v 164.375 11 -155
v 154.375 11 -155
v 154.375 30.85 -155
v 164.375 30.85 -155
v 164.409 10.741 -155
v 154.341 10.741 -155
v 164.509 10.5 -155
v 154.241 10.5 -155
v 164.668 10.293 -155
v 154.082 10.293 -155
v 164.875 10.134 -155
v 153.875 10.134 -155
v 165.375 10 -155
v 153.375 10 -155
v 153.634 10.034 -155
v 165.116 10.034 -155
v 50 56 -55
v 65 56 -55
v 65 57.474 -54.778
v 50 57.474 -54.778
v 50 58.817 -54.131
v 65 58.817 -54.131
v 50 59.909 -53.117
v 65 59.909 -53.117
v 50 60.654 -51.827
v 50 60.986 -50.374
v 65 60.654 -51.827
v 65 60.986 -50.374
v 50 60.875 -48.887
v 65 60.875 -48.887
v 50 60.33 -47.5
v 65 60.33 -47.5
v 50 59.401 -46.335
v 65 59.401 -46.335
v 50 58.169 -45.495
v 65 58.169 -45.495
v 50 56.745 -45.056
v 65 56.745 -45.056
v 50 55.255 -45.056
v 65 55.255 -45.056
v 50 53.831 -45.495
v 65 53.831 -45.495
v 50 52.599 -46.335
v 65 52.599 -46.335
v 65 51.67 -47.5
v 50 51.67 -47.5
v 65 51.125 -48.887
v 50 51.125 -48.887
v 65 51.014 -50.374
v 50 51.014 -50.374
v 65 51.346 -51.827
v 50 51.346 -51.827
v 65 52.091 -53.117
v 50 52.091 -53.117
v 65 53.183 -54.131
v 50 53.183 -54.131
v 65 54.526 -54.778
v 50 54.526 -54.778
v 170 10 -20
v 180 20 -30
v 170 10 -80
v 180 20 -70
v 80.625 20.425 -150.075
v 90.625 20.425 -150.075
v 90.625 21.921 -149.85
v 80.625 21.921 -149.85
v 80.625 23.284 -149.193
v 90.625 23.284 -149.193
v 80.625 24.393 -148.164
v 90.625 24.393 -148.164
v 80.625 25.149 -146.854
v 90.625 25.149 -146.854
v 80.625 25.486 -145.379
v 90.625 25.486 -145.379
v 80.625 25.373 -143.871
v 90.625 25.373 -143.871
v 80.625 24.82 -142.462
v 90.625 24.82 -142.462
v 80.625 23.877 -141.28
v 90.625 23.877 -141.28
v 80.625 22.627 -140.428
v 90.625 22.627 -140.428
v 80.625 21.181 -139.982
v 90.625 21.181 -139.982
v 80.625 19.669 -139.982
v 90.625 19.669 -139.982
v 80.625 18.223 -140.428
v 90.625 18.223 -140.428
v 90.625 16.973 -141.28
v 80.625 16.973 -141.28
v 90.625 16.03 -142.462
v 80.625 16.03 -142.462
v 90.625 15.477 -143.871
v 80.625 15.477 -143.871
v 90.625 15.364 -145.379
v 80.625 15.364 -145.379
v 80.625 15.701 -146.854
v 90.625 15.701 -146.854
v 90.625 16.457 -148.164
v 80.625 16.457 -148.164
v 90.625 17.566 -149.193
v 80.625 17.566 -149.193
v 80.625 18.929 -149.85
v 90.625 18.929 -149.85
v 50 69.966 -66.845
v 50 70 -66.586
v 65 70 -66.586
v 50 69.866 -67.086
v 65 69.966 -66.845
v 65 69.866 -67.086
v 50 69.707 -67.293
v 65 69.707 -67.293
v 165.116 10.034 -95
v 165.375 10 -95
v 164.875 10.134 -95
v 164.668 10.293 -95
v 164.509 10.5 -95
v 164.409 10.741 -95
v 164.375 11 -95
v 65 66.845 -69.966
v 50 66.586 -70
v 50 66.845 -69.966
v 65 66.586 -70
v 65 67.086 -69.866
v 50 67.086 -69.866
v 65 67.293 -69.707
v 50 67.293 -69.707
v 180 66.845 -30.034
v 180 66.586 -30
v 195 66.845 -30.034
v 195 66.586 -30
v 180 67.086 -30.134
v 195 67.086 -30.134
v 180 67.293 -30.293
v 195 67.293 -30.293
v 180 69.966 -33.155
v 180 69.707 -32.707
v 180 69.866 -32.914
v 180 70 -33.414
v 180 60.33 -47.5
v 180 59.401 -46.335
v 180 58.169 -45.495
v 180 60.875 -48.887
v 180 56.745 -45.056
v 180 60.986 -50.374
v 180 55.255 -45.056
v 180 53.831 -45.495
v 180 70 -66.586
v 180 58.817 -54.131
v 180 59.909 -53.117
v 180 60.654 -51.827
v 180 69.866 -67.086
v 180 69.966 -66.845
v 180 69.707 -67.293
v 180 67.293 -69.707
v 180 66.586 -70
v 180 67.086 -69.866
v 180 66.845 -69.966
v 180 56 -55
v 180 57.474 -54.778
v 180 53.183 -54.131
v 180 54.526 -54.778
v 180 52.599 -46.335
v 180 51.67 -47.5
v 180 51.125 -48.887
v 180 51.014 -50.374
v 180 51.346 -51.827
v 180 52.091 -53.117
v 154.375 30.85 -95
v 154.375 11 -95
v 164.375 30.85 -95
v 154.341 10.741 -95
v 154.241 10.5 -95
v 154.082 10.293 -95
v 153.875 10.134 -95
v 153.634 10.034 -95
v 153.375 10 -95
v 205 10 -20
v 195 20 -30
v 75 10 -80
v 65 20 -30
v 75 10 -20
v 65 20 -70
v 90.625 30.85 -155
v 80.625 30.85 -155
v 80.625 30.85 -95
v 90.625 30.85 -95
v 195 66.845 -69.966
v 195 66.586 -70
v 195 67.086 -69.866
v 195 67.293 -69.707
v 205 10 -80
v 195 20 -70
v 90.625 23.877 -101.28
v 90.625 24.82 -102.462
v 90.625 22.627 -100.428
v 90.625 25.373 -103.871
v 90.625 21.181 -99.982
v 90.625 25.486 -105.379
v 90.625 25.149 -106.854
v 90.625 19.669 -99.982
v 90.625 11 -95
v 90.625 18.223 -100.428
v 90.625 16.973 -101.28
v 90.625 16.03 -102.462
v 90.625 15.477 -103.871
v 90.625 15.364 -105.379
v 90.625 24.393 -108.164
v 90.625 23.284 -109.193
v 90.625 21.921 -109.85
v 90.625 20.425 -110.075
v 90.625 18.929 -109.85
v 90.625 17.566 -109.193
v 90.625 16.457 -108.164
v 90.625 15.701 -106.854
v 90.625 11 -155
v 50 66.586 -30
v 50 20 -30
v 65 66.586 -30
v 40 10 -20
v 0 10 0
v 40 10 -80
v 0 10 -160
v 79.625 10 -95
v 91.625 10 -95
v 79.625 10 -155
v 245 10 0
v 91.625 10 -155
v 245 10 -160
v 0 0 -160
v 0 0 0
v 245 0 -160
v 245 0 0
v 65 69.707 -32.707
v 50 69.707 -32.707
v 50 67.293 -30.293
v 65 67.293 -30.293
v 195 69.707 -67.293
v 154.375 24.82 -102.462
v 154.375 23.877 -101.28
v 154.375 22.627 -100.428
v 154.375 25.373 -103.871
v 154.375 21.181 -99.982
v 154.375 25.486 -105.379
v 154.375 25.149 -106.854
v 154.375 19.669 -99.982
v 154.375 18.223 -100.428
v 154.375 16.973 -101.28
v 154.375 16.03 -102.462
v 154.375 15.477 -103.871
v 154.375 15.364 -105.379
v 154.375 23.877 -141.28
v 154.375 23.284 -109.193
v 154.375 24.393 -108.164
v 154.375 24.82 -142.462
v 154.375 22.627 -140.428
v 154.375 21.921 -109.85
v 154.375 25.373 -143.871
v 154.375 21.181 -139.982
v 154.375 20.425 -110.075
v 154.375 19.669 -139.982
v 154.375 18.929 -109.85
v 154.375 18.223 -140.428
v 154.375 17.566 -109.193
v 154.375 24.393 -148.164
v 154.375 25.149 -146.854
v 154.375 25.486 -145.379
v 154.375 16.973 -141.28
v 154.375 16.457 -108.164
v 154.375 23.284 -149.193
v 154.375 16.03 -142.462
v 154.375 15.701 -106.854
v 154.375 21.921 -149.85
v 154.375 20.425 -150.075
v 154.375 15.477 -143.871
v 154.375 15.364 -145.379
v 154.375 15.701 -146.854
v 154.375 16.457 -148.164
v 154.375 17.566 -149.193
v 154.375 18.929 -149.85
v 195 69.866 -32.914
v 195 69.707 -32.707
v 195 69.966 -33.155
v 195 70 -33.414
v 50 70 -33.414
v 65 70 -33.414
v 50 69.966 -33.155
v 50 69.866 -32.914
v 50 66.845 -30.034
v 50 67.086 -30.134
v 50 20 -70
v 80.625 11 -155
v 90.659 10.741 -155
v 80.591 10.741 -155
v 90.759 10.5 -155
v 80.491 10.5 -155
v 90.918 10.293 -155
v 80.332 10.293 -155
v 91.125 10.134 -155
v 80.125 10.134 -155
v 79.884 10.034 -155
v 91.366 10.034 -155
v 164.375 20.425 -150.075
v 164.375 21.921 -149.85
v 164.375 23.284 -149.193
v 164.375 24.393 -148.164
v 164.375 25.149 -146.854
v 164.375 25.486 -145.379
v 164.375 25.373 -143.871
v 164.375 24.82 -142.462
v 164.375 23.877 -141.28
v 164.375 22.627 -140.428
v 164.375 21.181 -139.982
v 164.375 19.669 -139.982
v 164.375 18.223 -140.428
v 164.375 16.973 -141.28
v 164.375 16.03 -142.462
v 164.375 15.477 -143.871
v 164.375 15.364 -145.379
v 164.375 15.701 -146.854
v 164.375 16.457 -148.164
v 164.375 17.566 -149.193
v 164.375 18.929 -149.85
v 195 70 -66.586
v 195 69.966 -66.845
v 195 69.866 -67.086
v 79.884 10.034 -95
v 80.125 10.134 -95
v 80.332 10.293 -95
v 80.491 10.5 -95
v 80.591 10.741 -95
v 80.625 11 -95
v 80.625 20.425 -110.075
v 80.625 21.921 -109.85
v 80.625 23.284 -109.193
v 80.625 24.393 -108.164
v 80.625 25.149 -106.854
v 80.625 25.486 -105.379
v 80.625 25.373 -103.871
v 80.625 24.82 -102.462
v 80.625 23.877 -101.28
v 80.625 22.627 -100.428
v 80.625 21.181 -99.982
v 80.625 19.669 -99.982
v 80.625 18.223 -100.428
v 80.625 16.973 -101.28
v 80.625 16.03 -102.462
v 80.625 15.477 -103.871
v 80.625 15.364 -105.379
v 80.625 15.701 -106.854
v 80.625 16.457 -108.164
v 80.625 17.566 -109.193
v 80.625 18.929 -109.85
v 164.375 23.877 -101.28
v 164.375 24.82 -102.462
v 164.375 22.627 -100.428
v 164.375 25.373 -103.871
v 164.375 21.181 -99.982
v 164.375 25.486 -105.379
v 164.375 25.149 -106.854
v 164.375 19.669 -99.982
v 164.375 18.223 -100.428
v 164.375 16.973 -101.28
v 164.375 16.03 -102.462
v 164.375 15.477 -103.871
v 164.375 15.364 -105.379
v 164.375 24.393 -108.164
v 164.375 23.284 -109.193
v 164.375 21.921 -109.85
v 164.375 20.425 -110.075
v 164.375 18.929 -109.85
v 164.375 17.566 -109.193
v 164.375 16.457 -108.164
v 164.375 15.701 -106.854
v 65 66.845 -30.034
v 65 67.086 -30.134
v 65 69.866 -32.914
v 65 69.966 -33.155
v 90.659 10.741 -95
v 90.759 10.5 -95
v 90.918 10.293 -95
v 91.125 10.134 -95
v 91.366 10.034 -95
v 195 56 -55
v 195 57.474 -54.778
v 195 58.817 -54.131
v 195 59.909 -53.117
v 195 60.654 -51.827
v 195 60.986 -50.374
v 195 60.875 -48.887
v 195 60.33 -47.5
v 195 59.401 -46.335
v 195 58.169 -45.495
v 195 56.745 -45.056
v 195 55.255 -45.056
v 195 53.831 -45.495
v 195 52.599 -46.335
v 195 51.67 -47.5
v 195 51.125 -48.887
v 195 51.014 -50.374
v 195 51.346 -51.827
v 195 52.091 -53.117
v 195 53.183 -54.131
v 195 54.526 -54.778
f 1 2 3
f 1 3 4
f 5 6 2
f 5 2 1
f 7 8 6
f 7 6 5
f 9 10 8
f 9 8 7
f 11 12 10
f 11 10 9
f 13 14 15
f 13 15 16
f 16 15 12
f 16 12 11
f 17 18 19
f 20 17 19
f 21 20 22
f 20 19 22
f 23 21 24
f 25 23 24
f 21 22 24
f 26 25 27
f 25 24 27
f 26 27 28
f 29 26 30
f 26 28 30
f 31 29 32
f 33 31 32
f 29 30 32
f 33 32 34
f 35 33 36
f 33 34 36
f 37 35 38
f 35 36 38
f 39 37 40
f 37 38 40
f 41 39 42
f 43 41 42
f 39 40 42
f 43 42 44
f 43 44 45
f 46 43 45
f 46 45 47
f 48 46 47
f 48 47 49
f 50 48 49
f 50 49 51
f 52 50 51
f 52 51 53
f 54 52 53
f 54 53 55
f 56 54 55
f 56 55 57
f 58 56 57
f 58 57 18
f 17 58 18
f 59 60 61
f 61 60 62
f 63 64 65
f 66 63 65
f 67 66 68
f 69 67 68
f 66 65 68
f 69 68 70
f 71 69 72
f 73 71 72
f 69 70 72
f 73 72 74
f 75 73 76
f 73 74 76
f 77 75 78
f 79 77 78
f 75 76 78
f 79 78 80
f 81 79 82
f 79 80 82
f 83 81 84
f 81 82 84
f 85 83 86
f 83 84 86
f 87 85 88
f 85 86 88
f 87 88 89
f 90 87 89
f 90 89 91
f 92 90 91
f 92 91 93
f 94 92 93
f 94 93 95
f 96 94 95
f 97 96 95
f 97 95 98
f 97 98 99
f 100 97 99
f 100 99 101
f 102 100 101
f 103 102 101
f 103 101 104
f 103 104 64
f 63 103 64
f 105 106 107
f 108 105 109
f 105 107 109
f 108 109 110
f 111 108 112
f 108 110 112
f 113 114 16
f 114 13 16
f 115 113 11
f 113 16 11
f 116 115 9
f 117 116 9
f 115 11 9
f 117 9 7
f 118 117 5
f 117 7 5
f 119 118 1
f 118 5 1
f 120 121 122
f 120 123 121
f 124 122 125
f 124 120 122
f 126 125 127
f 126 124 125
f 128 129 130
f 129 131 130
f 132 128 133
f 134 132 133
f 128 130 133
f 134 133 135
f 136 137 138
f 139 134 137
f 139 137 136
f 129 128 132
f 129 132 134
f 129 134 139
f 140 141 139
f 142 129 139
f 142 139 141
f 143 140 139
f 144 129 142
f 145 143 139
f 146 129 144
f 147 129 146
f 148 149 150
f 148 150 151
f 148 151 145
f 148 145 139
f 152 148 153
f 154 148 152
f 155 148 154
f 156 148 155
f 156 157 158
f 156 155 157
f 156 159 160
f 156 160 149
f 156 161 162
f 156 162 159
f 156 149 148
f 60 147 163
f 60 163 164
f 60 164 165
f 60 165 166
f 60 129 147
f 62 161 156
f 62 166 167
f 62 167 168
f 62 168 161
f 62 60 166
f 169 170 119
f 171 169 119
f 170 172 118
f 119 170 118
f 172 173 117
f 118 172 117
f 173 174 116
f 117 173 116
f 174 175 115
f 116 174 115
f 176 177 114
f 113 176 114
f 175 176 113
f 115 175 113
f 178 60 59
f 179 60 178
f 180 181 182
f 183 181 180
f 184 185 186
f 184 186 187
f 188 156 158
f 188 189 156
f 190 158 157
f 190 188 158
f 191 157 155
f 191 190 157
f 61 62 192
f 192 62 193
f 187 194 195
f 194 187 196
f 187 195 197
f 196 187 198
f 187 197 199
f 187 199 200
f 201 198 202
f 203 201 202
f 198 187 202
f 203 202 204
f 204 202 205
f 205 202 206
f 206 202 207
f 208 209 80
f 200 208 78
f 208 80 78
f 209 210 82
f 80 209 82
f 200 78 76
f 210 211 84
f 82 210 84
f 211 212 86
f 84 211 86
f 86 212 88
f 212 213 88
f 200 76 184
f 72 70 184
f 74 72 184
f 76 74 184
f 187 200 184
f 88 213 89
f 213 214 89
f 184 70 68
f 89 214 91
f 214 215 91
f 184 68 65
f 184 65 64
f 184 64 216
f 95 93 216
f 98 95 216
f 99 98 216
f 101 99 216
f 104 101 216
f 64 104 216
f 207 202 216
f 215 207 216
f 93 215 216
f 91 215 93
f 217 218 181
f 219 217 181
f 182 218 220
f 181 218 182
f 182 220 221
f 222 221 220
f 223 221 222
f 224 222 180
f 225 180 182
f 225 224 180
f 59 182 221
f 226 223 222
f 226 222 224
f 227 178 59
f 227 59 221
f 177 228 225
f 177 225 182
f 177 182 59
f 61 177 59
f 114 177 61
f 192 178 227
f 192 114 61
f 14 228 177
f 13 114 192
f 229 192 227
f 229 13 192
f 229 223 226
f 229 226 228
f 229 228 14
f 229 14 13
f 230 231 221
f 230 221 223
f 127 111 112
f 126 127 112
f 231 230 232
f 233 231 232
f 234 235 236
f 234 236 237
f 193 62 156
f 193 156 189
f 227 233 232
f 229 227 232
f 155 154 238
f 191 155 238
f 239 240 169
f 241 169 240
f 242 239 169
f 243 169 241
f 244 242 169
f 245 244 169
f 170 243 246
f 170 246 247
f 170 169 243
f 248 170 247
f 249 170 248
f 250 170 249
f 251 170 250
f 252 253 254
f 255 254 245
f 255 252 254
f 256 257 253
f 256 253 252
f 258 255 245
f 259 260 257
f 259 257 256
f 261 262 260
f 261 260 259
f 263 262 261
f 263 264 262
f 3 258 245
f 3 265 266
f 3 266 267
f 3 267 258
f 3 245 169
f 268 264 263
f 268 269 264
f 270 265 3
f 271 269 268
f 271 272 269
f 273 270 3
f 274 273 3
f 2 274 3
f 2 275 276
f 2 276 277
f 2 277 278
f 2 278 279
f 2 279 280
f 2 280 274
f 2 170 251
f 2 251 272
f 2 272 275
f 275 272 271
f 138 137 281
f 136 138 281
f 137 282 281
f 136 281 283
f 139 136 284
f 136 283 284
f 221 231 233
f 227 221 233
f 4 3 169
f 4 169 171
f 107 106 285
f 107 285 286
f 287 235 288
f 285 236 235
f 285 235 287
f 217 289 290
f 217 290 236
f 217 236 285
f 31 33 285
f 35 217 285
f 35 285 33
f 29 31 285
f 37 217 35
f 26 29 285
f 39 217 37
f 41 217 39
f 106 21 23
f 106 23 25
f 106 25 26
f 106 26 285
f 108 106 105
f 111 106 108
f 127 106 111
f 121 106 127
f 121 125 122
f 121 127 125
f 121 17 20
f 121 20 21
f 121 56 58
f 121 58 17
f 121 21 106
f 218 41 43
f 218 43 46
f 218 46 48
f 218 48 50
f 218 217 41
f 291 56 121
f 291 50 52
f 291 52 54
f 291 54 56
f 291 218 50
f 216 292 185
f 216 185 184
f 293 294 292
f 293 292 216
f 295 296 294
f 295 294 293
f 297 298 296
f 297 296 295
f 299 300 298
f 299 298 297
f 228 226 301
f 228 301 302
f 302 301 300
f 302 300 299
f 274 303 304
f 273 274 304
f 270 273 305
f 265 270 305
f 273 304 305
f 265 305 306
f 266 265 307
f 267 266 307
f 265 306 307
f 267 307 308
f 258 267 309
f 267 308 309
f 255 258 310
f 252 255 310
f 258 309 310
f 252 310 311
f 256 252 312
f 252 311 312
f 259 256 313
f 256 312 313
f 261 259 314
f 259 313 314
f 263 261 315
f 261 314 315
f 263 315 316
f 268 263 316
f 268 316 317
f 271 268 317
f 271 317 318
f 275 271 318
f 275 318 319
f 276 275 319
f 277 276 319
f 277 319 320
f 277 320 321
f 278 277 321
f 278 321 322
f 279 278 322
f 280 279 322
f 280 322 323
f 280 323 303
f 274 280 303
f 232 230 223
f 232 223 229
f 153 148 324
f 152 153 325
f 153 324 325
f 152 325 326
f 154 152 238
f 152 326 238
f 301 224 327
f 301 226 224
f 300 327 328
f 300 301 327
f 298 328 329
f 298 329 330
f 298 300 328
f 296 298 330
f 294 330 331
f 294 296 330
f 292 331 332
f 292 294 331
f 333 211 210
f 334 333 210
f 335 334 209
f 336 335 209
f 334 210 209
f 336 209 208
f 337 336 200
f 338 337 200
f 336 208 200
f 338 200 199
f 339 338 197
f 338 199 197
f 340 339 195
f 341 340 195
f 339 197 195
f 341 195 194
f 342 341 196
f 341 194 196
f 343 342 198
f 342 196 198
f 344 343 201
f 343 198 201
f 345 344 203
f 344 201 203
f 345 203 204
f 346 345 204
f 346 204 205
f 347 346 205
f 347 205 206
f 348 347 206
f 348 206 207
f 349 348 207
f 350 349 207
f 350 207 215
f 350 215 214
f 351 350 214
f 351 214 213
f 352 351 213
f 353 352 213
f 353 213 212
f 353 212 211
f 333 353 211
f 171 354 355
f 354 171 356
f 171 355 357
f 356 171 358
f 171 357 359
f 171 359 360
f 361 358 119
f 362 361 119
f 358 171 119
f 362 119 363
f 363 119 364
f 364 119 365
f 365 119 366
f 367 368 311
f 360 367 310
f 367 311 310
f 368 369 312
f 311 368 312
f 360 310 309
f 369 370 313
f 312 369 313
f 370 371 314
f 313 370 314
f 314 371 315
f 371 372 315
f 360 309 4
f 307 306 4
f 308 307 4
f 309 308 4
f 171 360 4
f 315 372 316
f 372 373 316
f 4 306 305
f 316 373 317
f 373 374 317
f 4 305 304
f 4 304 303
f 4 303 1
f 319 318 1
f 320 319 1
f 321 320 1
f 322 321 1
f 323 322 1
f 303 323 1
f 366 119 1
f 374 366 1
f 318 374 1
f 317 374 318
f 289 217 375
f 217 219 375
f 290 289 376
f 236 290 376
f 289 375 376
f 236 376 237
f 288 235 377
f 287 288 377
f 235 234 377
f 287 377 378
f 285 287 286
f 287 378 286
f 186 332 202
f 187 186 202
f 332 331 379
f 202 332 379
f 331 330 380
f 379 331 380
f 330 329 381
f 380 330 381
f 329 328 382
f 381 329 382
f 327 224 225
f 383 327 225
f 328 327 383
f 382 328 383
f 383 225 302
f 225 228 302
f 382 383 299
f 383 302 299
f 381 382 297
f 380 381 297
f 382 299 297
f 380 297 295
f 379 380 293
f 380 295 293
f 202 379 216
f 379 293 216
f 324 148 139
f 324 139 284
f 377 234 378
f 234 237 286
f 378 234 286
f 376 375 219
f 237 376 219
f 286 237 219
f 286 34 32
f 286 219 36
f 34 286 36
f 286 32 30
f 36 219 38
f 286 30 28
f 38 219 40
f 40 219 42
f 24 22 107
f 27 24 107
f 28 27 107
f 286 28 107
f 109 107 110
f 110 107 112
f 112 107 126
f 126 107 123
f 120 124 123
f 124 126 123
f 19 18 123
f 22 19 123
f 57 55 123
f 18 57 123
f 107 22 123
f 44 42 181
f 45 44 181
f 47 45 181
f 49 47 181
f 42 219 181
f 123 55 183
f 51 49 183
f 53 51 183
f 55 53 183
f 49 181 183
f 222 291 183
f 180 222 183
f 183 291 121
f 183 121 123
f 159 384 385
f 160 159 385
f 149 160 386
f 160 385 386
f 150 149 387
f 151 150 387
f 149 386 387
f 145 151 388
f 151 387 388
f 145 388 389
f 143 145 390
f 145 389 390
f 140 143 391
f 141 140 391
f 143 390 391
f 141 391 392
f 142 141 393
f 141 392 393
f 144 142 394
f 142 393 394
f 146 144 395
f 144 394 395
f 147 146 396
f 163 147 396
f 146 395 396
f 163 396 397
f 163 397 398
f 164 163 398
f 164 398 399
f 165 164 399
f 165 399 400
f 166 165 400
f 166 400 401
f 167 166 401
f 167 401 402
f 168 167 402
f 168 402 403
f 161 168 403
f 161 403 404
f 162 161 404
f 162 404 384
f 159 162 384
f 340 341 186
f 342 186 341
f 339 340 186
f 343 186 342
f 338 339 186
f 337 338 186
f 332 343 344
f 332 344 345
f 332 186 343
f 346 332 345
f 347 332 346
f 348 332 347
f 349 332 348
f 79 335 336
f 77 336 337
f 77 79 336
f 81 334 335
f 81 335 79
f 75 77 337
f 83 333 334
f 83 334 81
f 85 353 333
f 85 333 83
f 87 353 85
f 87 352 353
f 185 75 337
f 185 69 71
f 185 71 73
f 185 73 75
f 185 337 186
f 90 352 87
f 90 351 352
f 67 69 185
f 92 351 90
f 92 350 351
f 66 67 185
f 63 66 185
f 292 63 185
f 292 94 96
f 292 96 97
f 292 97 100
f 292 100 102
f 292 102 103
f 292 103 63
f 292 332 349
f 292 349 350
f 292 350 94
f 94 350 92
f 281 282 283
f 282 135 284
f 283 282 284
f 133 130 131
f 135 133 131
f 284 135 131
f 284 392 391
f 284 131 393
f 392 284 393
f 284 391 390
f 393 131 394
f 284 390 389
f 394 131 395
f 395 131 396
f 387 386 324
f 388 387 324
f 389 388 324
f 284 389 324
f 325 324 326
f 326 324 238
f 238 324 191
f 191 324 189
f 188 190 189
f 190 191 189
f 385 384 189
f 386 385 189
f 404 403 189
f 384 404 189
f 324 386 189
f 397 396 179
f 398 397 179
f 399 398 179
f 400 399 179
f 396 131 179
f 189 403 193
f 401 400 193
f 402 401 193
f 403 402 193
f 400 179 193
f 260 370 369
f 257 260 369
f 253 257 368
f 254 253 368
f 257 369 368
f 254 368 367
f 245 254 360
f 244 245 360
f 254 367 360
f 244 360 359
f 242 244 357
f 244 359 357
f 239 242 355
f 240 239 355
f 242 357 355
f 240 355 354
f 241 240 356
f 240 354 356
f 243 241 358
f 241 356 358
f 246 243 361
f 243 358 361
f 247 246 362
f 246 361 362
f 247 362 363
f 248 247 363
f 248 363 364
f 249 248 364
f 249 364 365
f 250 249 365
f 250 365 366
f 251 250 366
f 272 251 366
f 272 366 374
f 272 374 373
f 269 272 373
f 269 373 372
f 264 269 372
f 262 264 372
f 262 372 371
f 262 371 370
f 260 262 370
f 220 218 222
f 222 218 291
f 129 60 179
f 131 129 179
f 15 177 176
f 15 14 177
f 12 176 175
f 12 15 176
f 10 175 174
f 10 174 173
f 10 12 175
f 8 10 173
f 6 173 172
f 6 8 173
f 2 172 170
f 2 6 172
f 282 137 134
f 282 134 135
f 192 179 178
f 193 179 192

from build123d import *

# Parameters (mm, degrees)
SKETCH1_W           = 245
SKETCH1_H           = 160
BOSS_EXTRUDE1_DEPTH = 10
SKETCH2_W           = 15
SKETCH2_H           = 40
BOSS_EXTRUDE3_DEPTH = 60
SKETCH3_R           = 5
CUT_EXTRUDE1_DEPTH  = 146
CHAMFER1_SIZE       = 10
CHAMFER2_SIZE       = 3
FILLET1_R           = 1
SKETCH4_W           = 10
SKETCH4_H           = 60
BOSS_EXTRUDE4_DEPTH = 20.85
SKETCH7_R           = 5.075
CUT_EXTRUDE2_DEPTH  = 86
FILLET2_R           = 1


with BuildPart() as part:
    # Sketch1 → Boss-Extrude1 (new body)
    with BuildSketch(Plane(origin=(0, 0, 0), x_dir=(1, 0, 0), z_dir=(0, 1, 0))):
        with Locations((122.5, 80)):
            Rectangle(SKETCH1_W, SKETCH1_H)
    extrude(amount=BOSS_EXTRUDE1_DEPTH)

    # Sketch2 → Boss-Extrude3 (add)
    with BuildSketch(Plane(origin=(0, 10, 0), x_dir=(1, 0, 0), z_dir=(0, 1, 0))):
        with Locations((57.5, 50)):
            Rectangle(SKETCH2_W, SKETCH2_H)
        with Locations((187.5, 50)):
            Rectangle(SKETCH2_W, SKETCH2_H)
    extrude(amount=BOSS_EXTRUDE3_DEPTH)

    # Sketch3 → Cut-Extrude1 (cut)
    with BuildSketch(Plane(origin=(195, 0, 0), x_dir=(0, 0, -1), z_dir=(1, 0, 0))):
        with Locations((50, 56)):
            Circle(SKETCH3_R)
    extrude(amount=-CUT_EXTRUDE1_DEPTH, mode=Mode.SUBTRACT)

    # Chamfer1
    chamfer1_edges = [part.edges().sort_by_distance(p)[0] for p in [
        (65, 10, -50),
        (57.5, 10, -70),
        (50, 10, -50),
        (57.5, 10, -30),
        (195, 10, -50),
        (187.5, 10, -70),
        (180, 10, -50),
        (187.5, 10, -30),
    ]]
    chamfer(chamfer1_edges, length=CHAMFER1_SIZE)

    # Chamfer2
    chamfer2_edges = [part.edges().sort_by_distance(p)[0] for p in [
        (57.5, 70, -70),
        (57.5, 70, -30),
        (187.5, 70, -70),
        (187.5, 70, -30),
    ]]
    chamfer(chamfer2_edges, length=CHAMFER2_SIZE)

    # Fillet1
    fillet1_edges = [part.edges().sort_by_distance(p)[0] for p in [
        (57.5, 70, -67),
        (57.5, 70, -33),
        (57.5, 67, -30),
        (57.5, 67, -70),
        (187.5, 70, -33),
        (187.5, 70, -67),
        (187.5, 67, -70),
        (187.5, 67, -30),
    ]]
    fillet(fillet1_edges, radius=FILLET1_R)

    # Sketch4 → Boss-Extrude4 (add)
    with BuildSketch(Plane(origin=(0, 10, 0), x_dir=(1, 0, 0), z_dir=(0, 1, 0))):
        with Locations((85.625, 125)):
            Rectangle(SKETCH4_W, SKETCH4_H)
        with Locations((159.375, 125)):
            Rectangle(SKETCH4_W, SKETCH4_H)
    extrude(amount=BOSS_EXTRUDE4_DEPTH)

    # Sketch7 → Cut-Extrude2 (cut)
    with BuildSketch(Plane(origin=(164.375, 0, 0), x_dir=(0, 0, -1), z_dir=(1, 0, 0))):
        with Locations((105, 20.425)):
            Circle(SKETCH7_R)
        with Locations((145, 20.425)):
            Circle(SKETCH7_R)
    extrude(amount=-CUT_EXTRUDE2_DEPTH, mode=Mode.SUBTRACT)

    # Fillet2
    fillet2_edges = [part.edges().sort_by_distance(p)[0] for p in [
        (90.625, 10, -125),
        (80.625, 10, -125),
        (164.375, 10, -125),
        (154.375, 10, -125),
    ]]
    fillet(fillet2_edges, radius=FILLET2_R)


solid = part.part
